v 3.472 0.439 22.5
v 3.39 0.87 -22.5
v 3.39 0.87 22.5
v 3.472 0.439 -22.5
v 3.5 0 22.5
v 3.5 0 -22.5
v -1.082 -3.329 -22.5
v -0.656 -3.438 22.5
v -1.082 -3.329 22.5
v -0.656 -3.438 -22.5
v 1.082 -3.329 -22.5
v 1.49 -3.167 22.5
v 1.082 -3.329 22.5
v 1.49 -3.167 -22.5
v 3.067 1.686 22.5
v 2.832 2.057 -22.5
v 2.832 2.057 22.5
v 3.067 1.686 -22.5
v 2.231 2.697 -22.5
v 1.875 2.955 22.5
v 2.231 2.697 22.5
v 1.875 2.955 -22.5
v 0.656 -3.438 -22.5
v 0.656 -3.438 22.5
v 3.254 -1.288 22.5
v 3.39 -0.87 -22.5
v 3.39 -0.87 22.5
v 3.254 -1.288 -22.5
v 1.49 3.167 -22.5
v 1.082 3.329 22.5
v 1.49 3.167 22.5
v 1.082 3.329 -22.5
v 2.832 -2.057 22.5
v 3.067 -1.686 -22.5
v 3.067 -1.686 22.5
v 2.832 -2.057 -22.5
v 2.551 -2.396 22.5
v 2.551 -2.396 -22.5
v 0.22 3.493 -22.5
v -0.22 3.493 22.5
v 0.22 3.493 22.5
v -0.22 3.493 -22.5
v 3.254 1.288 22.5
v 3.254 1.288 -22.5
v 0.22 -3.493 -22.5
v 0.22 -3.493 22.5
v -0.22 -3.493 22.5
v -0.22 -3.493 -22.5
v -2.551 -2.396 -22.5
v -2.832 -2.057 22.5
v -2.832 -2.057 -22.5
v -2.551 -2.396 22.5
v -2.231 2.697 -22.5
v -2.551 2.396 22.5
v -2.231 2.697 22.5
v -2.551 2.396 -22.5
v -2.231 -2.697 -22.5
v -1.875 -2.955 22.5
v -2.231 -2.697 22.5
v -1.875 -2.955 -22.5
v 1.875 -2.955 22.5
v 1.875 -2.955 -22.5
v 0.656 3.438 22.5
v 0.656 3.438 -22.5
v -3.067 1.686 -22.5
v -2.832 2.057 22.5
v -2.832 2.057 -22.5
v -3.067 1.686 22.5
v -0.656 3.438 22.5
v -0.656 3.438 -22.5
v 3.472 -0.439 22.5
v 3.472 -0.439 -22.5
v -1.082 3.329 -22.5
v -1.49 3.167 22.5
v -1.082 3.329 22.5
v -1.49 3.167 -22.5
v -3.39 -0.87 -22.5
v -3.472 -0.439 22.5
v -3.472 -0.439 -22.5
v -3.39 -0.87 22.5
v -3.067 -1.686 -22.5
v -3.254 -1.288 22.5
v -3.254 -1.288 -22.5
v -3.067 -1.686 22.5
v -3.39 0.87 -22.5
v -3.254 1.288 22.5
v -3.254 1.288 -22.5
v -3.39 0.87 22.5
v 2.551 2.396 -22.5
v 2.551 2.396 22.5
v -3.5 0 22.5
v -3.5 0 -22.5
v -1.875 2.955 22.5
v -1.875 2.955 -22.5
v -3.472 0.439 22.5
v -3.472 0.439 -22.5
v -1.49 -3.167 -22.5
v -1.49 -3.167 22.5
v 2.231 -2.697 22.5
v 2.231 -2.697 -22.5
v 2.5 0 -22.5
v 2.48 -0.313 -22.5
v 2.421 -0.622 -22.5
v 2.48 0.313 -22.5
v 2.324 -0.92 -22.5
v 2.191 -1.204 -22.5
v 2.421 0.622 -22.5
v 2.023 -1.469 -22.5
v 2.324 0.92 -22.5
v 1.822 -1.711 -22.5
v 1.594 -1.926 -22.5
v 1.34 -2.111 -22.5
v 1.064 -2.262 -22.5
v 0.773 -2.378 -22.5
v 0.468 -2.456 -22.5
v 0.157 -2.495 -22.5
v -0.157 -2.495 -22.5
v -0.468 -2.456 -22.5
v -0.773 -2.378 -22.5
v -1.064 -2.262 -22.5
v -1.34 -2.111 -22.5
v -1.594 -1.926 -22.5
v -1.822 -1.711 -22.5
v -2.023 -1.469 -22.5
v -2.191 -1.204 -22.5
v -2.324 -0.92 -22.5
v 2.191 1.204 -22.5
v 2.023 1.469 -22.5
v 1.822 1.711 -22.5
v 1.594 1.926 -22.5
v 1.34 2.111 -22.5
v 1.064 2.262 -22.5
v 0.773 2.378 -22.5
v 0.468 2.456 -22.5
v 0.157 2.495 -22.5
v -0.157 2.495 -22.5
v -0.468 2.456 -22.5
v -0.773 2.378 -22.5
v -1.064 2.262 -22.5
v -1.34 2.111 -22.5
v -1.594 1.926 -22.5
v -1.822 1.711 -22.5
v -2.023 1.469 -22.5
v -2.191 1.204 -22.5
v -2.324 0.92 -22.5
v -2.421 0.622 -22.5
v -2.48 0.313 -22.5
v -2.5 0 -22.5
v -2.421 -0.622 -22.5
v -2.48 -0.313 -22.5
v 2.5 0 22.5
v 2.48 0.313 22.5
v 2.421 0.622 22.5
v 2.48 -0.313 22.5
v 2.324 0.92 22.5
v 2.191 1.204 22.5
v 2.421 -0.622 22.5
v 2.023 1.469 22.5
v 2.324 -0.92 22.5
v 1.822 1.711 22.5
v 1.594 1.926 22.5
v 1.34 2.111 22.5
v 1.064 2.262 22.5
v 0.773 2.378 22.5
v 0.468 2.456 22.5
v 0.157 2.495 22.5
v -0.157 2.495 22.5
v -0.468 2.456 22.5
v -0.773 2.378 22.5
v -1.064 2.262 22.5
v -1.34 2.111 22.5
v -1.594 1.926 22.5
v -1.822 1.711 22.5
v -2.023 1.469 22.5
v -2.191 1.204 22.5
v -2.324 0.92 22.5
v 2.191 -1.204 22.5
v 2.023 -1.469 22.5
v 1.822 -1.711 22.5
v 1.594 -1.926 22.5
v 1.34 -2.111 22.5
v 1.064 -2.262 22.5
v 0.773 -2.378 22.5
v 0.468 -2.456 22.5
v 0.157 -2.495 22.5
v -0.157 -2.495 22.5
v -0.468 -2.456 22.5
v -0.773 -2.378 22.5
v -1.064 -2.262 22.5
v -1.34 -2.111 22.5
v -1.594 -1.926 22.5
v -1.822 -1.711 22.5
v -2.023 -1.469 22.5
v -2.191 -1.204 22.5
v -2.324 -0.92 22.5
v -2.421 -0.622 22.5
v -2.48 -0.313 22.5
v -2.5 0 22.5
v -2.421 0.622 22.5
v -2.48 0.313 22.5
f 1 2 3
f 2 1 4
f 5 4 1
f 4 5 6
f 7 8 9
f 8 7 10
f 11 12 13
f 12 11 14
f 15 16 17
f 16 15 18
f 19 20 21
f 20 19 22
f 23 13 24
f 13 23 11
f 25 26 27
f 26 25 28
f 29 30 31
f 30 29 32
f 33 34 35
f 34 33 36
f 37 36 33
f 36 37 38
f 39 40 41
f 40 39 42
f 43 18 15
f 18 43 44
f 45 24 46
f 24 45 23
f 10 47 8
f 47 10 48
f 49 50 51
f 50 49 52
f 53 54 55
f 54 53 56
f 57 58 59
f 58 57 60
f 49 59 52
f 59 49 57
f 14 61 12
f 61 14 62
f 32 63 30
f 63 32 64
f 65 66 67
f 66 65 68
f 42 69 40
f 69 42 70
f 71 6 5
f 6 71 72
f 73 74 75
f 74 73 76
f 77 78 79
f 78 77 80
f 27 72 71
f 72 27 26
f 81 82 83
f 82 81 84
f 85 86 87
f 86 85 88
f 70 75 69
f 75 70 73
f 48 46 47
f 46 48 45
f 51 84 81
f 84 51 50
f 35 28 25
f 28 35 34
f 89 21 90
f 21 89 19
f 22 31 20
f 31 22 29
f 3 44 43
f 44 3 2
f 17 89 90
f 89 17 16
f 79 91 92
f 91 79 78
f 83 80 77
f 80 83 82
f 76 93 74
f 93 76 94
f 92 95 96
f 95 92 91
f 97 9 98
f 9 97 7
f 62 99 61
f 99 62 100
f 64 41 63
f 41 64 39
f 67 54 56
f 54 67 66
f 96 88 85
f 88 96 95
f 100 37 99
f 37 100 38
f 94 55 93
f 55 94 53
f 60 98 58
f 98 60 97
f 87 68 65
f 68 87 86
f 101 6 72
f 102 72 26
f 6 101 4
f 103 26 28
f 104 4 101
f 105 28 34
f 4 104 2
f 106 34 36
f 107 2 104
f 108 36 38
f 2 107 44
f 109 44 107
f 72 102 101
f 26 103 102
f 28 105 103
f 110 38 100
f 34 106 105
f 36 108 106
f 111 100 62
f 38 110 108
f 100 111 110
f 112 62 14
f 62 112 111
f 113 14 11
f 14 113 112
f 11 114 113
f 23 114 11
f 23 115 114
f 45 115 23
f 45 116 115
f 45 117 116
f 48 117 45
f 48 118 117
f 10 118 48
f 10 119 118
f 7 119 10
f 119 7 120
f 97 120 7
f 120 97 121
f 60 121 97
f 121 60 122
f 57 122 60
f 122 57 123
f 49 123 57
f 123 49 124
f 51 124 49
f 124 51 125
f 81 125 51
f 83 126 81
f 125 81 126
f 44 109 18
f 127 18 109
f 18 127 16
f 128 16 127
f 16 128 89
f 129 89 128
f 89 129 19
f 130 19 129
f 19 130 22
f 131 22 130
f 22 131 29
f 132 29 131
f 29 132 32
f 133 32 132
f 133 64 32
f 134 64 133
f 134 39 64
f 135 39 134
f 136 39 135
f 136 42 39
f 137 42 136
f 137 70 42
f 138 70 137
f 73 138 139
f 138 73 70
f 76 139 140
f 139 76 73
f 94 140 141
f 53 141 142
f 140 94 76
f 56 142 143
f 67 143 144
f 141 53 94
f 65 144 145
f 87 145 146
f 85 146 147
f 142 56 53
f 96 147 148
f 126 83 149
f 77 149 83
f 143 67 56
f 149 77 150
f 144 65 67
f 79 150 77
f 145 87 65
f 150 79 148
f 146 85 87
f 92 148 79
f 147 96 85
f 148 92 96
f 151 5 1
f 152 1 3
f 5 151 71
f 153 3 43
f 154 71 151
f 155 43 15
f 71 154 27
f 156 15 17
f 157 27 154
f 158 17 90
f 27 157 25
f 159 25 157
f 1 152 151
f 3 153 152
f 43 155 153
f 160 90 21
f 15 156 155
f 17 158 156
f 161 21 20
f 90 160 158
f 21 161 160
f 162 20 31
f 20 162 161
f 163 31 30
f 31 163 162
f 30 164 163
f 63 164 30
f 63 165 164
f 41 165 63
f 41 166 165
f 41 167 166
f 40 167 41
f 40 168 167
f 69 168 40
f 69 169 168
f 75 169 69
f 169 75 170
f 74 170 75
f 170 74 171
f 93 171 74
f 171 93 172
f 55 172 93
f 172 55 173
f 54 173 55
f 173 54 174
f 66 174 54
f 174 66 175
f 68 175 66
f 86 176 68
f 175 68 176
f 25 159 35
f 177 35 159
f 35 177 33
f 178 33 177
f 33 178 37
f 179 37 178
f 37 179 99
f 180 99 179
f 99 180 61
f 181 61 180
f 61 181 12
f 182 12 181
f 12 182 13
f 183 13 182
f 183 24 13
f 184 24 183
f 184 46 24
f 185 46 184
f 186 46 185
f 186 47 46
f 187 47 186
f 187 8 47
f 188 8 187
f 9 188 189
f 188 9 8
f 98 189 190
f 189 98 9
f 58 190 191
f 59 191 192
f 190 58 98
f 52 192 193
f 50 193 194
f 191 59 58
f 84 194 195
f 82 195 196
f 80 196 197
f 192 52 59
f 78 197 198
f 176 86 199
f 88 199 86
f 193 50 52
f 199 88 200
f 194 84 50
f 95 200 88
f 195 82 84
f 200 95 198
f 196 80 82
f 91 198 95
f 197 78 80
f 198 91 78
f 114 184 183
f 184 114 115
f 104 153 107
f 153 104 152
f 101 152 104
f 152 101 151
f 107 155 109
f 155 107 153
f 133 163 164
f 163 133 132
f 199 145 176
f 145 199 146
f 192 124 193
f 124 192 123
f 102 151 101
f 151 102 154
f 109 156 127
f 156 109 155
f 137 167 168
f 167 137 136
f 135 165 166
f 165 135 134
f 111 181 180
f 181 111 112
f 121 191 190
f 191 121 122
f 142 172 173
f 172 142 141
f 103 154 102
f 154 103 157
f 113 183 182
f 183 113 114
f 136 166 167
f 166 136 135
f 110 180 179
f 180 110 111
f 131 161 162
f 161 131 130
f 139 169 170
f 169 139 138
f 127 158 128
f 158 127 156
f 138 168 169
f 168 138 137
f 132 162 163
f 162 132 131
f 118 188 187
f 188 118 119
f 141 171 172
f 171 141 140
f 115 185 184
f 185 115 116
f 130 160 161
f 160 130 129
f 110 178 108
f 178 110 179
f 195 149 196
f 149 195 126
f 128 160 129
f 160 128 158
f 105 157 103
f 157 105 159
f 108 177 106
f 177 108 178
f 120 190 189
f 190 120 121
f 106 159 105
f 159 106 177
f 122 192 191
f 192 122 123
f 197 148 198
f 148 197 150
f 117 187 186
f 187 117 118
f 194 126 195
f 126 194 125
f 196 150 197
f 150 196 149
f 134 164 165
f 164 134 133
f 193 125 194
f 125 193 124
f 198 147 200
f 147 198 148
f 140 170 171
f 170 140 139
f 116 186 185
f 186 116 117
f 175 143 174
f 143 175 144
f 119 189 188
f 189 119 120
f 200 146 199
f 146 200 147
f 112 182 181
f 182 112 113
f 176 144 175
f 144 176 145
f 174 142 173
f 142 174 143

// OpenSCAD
$fn = 50;


difference() {
	union() {
		translate(v = [0, 0, -22.5000000000]) {
			cylinder(h = 45, r = 3.5000000000);
		}
	}
	union() {
		translate(v = [0, 0, -100.0000000000]) {
			cylinder(h = 200, r = 2.5000000000);
		}
	}
}
